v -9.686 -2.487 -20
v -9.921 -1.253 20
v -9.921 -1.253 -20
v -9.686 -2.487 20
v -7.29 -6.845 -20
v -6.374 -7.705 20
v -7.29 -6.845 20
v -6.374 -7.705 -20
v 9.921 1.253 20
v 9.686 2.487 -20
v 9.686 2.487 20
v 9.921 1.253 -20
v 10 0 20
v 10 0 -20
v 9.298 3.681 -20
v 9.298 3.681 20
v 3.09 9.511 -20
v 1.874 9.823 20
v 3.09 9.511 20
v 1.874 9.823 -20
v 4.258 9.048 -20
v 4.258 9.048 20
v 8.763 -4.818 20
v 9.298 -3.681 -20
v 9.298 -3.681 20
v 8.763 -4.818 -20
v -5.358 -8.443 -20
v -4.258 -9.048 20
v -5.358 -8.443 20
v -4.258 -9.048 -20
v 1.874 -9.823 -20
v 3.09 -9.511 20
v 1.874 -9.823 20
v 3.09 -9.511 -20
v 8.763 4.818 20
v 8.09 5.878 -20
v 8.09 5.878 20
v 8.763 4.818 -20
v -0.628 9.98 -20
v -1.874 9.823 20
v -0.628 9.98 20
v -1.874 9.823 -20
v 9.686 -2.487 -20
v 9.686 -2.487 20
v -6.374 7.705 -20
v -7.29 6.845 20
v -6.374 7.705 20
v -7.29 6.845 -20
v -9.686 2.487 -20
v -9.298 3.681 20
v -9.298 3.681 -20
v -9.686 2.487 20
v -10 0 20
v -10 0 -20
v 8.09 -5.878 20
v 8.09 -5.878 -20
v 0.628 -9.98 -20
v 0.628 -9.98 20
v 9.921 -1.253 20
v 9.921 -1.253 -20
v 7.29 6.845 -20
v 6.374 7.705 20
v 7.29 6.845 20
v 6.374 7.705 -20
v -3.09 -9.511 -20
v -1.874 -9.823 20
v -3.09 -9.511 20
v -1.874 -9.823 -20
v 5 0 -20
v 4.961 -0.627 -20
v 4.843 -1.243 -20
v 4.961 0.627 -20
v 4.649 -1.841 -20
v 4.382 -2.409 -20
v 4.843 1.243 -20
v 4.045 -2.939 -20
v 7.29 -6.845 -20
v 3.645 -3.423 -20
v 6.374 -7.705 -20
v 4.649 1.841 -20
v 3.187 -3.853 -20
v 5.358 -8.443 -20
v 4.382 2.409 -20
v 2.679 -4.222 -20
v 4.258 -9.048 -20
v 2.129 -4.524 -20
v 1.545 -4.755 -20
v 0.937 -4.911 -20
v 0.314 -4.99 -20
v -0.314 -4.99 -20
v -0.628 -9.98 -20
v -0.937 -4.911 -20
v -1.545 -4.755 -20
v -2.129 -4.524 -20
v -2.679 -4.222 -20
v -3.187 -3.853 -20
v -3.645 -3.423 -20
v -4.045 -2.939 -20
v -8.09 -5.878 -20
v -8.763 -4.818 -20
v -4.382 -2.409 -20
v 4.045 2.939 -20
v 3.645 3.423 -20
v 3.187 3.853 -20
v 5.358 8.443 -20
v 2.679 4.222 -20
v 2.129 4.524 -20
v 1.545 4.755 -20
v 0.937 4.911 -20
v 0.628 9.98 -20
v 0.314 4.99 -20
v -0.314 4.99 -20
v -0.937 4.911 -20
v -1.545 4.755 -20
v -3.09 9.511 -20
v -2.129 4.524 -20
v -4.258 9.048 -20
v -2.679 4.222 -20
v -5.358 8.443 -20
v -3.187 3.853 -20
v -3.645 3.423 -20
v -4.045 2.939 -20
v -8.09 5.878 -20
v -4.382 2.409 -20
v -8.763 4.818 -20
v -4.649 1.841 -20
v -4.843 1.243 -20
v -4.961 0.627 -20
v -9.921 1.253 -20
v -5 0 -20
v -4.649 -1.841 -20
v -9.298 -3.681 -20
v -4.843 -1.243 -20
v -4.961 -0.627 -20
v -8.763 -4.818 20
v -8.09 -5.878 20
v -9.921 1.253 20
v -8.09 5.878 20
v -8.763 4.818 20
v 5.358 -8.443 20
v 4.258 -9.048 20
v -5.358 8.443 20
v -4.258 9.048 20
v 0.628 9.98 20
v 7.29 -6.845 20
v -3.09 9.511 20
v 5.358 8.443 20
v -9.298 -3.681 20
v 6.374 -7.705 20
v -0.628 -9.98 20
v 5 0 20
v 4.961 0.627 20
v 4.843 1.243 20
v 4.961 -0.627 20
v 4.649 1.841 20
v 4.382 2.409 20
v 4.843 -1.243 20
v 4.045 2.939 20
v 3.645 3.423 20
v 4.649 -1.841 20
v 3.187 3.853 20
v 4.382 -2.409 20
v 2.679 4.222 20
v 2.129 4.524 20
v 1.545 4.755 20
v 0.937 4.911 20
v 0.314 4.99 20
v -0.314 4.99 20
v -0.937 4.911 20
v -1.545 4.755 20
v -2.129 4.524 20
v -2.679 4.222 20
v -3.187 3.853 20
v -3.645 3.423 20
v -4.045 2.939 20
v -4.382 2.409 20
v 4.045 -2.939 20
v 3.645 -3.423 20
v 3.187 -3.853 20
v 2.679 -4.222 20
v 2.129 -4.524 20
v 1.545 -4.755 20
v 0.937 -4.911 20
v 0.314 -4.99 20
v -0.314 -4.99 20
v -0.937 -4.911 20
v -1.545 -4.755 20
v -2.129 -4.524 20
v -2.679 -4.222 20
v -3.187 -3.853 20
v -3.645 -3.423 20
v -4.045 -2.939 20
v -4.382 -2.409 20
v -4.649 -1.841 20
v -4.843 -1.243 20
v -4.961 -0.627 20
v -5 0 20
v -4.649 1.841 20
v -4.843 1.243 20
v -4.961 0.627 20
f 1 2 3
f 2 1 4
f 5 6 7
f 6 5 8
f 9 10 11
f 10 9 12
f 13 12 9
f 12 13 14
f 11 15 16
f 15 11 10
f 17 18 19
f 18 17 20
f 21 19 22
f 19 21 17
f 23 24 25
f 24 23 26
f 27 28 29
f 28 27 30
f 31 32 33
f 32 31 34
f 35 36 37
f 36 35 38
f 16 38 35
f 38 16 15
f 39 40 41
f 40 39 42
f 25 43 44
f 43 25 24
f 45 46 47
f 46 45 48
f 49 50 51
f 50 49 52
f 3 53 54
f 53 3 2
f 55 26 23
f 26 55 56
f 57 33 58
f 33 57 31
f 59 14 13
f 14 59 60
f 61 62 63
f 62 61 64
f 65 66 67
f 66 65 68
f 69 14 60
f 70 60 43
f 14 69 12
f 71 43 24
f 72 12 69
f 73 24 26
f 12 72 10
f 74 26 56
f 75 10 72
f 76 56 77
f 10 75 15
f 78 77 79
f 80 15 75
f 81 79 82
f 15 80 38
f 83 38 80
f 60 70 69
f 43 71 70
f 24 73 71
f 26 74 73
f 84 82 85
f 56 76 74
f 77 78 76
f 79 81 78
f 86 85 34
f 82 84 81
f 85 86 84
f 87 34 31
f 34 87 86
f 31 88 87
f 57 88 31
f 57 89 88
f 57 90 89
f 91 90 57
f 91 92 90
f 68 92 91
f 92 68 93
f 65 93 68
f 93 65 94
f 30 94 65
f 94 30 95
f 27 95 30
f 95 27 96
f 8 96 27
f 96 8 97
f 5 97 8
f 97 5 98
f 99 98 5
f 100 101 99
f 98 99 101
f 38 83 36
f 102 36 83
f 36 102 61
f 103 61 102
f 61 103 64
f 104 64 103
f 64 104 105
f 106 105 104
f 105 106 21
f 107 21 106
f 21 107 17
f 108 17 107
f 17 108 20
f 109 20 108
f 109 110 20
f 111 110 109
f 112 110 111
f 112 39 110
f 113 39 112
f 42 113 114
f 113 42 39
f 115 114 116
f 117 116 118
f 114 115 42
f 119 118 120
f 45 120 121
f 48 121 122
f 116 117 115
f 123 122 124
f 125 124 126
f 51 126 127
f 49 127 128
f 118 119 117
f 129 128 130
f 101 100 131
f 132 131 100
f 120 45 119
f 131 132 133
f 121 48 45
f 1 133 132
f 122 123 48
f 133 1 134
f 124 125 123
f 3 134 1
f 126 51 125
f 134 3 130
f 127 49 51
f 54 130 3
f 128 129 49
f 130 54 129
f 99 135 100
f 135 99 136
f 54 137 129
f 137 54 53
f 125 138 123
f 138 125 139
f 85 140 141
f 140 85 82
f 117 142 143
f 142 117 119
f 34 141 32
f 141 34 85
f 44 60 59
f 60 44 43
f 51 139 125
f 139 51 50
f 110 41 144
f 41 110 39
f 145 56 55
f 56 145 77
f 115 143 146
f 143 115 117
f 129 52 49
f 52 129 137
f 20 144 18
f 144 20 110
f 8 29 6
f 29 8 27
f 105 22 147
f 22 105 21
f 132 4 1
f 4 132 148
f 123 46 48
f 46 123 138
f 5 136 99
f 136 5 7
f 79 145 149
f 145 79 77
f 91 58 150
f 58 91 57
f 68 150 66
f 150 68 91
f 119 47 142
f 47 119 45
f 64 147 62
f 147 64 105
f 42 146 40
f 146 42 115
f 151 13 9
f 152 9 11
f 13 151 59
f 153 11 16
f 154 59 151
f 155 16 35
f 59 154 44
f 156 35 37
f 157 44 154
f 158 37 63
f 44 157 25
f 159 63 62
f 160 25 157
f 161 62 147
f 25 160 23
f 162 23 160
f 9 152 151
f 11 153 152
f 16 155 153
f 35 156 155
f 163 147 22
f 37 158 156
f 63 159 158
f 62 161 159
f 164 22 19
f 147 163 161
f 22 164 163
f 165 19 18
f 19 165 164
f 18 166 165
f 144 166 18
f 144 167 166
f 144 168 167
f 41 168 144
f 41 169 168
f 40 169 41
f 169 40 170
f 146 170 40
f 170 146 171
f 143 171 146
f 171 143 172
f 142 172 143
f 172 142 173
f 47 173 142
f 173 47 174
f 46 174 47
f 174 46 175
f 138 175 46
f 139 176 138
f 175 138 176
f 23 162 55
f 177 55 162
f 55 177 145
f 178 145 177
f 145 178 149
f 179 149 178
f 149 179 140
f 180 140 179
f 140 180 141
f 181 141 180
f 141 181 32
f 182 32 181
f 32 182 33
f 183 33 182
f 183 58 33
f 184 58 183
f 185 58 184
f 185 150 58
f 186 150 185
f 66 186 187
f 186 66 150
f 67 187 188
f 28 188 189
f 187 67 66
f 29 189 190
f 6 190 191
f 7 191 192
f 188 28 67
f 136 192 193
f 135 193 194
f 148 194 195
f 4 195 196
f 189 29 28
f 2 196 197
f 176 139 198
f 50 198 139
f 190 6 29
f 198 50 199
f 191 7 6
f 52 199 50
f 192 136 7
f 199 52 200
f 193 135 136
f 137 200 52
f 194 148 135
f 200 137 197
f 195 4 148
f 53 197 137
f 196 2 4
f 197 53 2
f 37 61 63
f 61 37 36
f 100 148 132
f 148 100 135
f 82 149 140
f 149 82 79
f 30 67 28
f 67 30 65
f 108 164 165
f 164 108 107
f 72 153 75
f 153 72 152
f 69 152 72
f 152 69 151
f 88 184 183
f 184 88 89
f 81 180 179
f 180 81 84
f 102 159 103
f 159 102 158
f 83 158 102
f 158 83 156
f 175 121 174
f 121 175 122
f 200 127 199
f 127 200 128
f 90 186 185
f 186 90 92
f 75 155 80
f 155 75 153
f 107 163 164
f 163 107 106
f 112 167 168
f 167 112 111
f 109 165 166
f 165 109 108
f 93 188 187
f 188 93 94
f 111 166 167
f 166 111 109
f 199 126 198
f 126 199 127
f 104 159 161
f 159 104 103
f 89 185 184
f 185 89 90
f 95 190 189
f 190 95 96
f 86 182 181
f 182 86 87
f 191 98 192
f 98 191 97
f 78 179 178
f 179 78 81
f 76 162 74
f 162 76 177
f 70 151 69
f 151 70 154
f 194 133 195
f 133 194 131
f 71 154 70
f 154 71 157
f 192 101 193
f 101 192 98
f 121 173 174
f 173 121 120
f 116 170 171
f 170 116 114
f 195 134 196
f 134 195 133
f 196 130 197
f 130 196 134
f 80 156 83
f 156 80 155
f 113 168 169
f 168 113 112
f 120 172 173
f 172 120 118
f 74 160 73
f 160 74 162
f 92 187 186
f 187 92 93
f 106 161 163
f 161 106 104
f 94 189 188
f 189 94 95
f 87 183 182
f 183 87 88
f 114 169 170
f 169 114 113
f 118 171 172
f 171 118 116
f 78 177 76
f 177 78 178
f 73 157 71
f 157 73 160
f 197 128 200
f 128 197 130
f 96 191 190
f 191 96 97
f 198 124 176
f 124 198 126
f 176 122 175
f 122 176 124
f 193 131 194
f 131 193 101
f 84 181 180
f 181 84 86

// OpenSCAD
$fn = 50;


difference() {
	union() {
		translate(v = [0, 0, -20.0000000000]) {
			cylinder(h = 40, r = 10.0000000000);
		}
	}
	union() {
		translate(v = [0, 0, -100.0000000000]) {
			cylinder(h = 200, r = 5.0000000000);
		}
	}
}
